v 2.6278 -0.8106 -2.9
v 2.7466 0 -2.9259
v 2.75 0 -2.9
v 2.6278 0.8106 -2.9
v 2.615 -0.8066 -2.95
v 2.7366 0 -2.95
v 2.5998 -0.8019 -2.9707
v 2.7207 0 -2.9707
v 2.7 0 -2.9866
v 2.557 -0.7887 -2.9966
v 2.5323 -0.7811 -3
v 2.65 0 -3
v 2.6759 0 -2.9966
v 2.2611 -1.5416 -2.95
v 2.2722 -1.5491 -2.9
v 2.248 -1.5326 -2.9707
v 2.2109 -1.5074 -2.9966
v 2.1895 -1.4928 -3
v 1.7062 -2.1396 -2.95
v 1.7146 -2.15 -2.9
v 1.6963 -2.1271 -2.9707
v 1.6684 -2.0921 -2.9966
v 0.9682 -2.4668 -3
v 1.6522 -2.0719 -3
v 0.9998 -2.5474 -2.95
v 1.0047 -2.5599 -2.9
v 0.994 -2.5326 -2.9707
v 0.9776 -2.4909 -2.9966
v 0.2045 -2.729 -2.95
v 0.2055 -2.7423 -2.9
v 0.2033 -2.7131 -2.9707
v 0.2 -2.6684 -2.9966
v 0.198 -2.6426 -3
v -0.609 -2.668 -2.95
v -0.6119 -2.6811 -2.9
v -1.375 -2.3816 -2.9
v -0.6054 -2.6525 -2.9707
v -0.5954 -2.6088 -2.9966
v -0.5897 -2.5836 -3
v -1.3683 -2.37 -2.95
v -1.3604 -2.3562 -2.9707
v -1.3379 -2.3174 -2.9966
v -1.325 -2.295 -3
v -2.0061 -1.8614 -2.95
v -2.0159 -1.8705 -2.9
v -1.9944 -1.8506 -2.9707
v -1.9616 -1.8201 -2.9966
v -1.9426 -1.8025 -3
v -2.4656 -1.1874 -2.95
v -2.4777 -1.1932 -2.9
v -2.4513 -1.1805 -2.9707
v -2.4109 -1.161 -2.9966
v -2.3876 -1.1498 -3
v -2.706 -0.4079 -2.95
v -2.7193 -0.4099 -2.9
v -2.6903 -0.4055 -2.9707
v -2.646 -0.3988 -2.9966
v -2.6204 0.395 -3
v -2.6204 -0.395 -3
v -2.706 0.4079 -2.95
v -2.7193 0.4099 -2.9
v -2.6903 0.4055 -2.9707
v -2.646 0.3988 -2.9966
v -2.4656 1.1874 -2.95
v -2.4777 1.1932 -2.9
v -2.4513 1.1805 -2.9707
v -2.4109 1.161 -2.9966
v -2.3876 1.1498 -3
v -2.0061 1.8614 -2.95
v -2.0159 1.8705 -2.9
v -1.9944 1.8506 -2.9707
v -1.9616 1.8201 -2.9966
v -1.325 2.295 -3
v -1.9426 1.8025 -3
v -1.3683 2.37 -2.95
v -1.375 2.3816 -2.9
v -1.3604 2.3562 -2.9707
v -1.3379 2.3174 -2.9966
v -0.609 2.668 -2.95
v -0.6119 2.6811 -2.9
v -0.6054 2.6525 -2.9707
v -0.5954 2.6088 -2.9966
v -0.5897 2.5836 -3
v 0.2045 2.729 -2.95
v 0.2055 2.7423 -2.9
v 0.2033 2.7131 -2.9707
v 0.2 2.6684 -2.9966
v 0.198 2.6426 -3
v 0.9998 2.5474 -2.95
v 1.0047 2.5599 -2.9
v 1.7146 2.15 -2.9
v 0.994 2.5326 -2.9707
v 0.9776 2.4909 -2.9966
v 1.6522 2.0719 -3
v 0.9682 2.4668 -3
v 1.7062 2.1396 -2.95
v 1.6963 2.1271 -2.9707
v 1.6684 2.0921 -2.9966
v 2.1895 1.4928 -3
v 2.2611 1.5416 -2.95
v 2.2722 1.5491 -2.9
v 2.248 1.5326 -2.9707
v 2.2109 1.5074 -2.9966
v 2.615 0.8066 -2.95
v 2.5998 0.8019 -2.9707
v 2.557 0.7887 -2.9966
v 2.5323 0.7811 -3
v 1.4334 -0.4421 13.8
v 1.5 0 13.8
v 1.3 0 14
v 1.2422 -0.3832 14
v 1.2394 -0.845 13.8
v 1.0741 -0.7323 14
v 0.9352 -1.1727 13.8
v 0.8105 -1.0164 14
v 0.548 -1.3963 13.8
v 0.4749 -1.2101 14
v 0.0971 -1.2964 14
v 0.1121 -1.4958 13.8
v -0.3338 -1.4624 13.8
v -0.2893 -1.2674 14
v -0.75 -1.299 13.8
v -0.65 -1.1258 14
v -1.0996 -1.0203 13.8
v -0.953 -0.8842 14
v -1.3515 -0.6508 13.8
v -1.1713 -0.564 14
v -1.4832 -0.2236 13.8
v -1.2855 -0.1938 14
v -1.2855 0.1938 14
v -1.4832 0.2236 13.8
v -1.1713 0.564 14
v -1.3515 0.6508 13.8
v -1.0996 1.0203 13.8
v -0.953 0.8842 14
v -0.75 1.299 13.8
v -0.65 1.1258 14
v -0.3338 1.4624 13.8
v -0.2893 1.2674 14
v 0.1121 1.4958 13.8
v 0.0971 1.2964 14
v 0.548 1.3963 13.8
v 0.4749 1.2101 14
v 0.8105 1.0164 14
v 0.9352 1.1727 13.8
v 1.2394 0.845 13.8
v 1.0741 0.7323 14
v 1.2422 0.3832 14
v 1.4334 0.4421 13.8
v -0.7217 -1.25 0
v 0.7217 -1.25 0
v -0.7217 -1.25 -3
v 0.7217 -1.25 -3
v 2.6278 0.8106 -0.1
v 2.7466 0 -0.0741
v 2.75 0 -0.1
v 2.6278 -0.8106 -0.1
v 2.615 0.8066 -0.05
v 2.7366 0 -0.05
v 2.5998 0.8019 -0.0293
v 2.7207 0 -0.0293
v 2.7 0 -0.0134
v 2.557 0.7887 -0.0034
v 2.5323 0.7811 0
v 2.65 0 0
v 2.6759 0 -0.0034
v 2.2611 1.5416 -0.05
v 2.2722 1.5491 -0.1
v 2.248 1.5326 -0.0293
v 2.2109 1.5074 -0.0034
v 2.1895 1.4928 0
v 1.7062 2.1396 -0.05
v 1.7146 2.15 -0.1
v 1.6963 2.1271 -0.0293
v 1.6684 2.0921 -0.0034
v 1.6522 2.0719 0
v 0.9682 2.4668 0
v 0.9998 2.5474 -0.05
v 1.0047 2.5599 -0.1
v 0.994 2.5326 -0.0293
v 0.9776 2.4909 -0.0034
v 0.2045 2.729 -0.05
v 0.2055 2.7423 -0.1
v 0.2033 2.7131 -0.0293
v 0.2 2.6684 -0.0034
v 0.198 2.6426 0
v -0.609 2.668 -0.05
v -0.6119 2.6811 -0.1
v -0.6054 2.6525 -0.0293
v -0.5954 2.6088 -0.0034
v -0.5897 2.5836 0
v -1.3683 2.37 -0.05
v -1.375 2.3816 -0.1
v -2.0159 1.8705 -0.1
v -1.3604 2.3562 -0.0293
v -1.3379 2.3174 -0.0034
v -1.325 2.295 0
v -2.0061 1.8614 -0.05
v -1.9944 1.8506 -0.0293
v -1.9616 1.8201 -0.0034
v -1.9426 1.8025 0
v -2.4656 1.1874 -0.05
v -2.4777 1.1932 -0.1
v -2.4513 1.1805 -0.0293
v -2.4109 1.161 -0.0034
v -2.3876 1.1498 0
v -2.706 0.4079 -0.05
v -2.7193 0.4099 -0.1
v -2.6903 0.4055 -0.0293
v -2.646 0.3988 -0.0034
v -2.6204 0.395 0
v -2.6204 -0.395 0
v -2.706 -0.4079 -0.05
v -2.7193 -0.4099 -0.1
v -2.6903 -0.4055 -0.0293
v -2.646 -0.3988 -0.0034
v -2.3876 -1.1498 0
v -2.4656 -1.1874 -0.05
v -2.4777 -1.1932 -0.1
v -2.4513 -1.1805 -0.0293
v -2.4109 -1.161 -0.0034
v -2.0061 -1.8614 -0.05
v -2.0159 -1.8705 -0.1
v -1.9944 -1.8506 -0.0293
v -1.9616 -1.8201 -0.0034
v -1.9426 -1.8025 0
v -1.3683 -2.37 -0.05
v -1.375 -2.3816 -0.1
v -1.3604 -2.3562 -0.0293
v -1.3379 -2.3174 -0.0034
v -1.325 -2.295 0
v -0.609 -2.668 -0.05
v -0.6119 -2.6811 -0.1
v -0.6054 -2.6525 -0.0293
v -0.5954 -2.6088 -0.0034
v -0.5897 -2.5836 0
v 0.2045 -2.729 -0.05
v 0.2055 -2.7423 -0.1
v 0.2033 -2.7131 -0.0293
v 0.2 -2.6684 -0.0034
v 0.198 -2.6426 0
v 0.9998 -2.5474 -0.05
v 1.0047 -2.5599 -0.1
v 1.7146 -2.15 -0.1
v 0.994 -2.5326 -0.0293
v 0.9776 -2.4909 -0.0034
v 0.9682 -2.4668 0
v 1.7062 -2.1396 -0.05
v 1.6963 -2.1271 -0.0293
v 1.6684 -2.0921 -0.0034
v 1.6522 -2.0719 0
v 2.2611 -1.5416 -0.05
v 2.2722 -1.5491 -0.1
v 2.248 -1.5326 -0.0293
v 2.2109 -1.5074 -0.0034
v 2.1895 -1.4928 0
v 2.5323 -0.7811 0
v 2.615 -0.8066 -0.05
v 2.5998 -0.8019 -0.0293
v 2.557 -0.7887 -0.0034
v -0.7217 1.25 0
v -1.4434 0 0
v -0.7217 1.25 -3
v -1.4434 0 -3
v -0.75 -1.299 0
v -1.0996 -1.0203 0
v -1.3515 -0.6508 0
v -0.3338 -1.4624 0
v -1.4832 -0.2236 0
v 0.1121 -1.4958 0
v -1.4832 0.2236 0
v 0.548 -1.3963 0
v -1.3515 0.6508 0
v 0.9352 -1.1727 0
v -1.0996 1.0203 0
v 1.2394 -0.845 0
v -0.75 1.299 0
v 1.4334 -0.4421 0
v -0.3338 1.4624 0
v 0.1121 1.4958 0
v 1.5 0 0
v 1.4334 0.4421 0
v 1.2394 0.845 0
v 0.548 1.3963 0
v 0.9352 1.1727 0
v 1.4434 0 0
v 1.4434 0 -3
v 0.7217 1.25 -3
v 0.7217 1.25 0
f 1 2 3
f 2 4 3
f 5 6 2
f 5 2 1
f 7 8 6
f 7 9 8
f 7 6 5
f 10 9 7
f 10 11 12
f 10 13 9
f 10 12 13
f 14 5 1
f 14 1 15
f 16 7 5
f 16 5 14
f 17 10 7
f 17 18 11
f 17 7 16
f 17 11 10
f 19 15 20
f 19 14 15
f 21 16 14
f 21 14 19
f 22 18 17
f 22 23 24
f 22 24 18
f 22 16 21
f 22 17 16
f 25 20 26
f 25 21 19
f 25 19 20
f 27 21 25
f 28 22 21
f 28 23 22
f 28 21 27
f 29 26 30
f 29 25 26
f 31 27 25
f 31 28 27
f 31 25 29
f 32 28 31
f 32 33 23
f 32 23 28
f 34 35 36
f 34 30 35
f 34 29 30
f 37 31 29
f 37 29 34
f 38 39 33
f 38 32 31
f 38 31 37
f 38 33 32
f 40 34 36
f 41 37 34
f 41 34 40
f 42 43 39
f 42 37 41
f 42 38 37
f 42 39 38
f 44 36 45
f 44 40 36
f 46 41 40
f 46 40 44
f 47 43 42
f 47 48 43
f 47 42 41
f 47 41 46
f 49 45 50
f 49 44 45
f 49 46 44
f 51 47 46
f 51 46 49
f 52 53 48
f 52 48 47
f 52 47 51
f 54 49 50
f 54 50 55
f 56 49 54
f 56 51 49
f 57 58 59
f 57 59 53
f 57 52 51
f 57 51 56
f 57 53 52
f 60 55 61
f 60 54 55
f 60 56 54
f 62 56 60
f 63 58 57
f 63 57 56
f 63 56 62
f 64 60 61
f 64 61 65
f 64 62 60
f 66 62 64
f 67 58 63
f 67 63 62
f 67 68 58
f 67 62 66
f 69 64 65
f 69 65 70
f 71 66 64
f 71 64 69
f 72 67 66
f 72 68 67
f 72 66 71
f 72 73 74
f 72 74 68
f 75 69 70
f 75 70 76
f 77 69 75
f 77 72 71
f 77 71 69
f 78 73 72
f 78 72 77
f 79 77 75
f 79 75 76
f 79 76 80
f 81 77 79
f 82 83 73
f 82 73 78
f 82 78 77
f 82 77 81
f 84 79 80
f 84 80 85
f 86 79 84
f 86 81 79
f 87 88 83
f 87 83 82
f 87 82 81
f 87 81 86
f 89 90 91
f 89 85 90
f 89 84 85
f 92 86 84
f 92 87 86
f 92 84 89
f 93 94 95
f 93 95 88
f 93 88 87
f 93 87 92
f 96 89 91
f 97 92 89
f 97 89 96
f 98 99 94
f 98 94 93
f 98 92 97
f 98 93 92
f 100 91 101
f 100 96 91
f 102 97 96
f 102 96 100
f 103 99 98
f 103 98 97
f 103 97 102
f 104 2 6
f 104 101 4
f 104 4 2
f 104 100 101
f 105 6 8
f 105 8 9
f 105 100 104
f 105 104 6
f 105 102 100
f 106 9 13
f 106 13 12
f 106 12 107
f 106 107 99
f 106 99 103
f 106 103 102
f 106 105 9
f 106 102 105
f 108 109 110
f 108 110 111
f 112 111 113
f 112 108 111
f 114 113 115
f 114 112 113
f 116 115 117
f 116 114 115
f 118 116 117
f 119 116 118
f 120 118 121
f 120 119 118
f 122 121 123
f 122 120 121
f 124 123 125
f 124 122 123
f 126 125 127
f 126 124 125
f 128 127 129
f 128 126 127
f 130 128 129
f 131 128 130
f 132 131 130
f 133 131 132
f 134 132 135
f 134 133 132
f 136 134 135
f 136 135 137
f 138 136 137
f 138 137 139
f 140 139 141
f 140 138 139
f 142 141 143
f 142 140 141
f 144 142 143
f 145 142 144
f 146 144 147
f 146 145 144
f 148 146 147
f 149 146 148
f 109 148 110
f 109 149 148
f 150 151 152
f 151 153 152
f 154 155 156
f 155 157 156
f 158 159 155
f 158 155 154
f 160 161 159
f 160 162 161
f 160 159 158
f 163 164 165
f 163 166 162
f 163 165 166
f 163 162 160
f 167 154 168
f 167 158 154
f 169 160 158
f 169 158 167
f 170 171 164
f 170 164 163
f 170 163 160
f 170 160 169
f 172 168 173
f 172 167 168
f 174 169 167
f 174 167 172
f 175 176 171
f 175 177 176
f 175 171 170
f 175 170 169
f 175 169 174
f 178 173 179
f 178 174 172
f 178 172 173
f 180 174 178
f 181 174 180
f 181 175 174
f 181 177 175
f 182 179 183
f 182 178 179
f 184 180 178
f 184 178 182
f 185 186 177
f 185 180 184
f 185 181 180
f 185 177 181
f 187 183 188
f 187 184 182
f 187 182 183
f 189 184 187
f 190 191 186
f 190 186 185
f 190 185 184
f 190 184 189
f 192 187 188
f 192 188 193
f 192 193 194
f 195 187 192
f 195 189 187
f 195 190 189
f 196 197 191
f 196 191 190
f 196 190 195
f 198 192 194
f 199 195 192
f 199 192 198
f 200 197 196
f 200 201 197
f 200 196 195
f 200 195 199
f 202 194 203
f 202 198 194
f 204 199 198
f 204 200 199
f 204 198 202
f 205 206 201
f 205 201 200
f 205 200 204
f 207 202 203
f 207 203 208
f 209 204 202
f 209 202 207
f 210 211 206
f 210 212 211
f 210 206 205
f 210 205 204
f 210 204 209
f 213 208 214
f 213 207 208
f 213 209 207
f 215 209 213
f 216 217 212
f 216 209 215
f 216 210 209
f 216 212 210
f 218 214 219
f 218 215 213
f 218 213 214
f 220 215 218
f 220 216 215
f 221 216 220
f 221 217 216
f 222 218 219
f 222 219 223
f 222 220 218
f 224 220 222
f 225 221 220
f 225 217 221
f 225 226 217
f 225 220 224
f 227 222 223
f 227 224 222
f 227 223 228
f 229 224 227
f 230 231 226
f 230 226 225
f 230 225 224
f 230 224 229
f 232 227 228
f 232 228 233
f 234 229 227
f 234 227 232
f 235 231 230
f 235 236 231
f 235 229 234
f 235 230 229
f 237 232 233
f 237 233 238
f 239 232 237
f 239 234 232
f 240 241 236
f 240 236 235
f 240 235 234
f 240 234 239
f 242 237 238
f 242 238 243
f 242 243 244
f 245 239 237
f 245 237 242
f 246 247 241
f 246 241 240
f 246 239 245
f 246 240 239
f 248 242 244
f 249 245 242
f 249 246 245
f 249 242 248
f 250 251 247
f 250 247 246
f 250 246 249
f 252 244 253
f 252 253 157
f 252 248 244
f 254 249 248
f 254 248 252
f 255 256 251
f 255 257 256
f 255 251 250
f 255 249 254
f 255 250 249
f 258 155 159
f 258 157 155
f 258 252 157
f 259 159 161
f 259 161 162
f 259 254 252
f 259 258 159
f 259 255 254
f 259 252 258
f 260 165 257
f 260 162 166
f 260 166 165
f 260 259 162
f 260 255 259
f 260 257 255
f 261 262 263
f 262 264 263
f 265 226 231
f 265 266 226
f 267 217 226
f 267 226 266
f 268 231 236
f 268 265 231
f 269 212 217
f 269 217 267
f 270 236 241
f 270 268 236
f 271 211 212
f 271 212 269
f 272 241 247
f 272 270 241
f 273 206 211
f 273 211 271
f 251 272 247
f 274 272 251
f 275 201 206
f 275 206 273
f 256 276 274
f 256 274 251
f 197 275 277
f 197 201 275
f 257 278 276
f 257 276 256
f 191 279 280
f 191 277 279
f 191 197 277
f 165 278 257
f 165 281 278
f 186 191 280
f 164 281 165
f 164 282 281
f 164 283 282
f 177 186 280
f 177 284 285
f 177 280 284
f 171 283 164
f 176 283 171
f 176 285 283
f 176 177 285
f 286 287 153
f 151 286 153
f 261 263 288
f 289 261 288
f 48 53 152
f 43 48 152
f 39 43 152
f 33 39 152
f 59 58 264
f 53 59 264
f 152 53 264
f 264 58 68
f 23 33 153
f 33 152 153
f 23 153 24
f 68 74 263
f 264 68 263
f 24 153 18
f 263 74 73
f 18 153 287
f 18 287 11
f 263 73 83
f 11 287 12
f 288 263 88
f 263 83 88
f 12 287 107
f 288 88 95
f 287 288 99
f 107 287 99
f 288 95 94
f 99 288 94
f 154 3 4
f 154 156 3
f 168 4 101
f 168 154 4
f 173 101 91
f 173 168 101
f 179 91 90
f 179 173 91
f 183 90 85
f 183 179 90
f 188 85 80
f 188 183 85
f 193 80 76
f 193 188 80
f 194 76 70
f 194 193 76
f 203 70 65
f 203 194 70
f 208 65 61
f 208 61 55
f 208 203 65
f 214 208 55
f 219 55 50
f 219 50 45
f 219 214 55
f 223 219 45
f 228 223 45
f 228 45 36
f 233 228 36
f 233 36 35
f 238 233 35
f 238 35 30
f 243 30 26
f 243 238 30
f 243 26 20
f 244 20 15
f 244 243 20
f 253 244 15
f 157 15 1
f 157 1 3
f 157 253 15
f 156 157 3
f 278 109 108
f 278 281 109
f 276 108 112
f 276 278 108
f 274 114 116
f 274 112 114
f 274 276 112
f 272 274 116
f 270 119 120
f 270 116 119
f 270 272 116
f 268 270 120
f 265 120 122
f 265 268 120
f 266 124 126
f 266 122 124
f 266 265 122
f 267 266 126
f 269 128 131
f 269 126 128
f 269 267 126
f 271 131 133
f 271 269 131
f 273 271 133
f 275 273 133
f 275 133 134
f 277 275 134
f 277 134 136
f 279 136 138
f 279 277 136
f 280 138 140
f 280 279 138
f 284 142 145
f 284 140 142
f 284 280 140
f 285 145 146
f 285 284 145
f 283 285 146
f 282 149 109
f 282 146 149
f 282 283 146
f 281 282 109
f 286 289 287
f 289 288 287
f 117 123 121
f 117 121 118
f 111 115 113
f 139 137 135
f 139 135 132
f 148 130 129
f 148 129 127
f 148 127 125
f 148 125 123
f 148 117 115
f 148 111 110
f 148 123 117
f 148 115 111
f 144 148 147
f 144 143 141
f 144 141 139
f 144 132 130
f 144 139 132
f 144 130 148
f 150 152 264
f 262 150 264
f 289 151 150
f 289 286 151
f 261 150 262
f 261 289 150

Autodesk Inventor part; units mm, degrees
ref_plane "YZ Plane" through (0, 0, 0) normal (1, 0, 0) x (0, 1, 0)
ref_plane "XZ Plane" through (0, 0, 0) normal (0, 1, 0) x (-1, 0, 0)
ref_plane "XY Plane" through (0, 0, 0) normal (0, 0, 1) x (1, 0, 0)
sketch "Sketch1" plane through (0, 0, 0) normal (0, 0, 1) x (1, 0, 0)
  circle A0 centre (0, 0) radius 2.75
extrude "Extrusion3" add sketch "Sketch1" against normal blind 3
sketch "Sketch2" plane through (0, 0, 0) normal (0, 0, 1) x (1, 0, 0)
  circle A0 centre (0, 0) radius 1.5
extrude "Extrusion2" add sketch "Sketch2" along normal blind 14
sketch "Sketch3" plane through (0, 0, -3) normal (0, 0, -1) x (-1, 0, 0)
  line L0 (-0.7217, 1.25) -> (-1.4434, 0)
  line L1 (0.7217, -1.25) -> (1.4434, 0)
  line L2 (1.4434, 0) -> (0.7217, 1.25)
  line L3 (-1.4434, 0) -> (-0.7217, -1.25)
  line L4 (0.7217, 1.25) -> (-0.7217, 1.25)
  line L5 (-0.7217, -1.25) -> (0.7217, -1.25)
extrude "Extrusion1" cut sketch "Sketch3" against normal blind 3
fillet "Fillet2" radius 0.1 1 edges at (-2.75, 0, -3)
fillet "Fillet1" radius 0.1 1 edges at (-2.75, 0, 0)
chamfer "Chamfer1" distance 0.2 angle 45 1 edges at (-1.5, 0, 14)
properties part number "DIN 912 M3 12 mm"
